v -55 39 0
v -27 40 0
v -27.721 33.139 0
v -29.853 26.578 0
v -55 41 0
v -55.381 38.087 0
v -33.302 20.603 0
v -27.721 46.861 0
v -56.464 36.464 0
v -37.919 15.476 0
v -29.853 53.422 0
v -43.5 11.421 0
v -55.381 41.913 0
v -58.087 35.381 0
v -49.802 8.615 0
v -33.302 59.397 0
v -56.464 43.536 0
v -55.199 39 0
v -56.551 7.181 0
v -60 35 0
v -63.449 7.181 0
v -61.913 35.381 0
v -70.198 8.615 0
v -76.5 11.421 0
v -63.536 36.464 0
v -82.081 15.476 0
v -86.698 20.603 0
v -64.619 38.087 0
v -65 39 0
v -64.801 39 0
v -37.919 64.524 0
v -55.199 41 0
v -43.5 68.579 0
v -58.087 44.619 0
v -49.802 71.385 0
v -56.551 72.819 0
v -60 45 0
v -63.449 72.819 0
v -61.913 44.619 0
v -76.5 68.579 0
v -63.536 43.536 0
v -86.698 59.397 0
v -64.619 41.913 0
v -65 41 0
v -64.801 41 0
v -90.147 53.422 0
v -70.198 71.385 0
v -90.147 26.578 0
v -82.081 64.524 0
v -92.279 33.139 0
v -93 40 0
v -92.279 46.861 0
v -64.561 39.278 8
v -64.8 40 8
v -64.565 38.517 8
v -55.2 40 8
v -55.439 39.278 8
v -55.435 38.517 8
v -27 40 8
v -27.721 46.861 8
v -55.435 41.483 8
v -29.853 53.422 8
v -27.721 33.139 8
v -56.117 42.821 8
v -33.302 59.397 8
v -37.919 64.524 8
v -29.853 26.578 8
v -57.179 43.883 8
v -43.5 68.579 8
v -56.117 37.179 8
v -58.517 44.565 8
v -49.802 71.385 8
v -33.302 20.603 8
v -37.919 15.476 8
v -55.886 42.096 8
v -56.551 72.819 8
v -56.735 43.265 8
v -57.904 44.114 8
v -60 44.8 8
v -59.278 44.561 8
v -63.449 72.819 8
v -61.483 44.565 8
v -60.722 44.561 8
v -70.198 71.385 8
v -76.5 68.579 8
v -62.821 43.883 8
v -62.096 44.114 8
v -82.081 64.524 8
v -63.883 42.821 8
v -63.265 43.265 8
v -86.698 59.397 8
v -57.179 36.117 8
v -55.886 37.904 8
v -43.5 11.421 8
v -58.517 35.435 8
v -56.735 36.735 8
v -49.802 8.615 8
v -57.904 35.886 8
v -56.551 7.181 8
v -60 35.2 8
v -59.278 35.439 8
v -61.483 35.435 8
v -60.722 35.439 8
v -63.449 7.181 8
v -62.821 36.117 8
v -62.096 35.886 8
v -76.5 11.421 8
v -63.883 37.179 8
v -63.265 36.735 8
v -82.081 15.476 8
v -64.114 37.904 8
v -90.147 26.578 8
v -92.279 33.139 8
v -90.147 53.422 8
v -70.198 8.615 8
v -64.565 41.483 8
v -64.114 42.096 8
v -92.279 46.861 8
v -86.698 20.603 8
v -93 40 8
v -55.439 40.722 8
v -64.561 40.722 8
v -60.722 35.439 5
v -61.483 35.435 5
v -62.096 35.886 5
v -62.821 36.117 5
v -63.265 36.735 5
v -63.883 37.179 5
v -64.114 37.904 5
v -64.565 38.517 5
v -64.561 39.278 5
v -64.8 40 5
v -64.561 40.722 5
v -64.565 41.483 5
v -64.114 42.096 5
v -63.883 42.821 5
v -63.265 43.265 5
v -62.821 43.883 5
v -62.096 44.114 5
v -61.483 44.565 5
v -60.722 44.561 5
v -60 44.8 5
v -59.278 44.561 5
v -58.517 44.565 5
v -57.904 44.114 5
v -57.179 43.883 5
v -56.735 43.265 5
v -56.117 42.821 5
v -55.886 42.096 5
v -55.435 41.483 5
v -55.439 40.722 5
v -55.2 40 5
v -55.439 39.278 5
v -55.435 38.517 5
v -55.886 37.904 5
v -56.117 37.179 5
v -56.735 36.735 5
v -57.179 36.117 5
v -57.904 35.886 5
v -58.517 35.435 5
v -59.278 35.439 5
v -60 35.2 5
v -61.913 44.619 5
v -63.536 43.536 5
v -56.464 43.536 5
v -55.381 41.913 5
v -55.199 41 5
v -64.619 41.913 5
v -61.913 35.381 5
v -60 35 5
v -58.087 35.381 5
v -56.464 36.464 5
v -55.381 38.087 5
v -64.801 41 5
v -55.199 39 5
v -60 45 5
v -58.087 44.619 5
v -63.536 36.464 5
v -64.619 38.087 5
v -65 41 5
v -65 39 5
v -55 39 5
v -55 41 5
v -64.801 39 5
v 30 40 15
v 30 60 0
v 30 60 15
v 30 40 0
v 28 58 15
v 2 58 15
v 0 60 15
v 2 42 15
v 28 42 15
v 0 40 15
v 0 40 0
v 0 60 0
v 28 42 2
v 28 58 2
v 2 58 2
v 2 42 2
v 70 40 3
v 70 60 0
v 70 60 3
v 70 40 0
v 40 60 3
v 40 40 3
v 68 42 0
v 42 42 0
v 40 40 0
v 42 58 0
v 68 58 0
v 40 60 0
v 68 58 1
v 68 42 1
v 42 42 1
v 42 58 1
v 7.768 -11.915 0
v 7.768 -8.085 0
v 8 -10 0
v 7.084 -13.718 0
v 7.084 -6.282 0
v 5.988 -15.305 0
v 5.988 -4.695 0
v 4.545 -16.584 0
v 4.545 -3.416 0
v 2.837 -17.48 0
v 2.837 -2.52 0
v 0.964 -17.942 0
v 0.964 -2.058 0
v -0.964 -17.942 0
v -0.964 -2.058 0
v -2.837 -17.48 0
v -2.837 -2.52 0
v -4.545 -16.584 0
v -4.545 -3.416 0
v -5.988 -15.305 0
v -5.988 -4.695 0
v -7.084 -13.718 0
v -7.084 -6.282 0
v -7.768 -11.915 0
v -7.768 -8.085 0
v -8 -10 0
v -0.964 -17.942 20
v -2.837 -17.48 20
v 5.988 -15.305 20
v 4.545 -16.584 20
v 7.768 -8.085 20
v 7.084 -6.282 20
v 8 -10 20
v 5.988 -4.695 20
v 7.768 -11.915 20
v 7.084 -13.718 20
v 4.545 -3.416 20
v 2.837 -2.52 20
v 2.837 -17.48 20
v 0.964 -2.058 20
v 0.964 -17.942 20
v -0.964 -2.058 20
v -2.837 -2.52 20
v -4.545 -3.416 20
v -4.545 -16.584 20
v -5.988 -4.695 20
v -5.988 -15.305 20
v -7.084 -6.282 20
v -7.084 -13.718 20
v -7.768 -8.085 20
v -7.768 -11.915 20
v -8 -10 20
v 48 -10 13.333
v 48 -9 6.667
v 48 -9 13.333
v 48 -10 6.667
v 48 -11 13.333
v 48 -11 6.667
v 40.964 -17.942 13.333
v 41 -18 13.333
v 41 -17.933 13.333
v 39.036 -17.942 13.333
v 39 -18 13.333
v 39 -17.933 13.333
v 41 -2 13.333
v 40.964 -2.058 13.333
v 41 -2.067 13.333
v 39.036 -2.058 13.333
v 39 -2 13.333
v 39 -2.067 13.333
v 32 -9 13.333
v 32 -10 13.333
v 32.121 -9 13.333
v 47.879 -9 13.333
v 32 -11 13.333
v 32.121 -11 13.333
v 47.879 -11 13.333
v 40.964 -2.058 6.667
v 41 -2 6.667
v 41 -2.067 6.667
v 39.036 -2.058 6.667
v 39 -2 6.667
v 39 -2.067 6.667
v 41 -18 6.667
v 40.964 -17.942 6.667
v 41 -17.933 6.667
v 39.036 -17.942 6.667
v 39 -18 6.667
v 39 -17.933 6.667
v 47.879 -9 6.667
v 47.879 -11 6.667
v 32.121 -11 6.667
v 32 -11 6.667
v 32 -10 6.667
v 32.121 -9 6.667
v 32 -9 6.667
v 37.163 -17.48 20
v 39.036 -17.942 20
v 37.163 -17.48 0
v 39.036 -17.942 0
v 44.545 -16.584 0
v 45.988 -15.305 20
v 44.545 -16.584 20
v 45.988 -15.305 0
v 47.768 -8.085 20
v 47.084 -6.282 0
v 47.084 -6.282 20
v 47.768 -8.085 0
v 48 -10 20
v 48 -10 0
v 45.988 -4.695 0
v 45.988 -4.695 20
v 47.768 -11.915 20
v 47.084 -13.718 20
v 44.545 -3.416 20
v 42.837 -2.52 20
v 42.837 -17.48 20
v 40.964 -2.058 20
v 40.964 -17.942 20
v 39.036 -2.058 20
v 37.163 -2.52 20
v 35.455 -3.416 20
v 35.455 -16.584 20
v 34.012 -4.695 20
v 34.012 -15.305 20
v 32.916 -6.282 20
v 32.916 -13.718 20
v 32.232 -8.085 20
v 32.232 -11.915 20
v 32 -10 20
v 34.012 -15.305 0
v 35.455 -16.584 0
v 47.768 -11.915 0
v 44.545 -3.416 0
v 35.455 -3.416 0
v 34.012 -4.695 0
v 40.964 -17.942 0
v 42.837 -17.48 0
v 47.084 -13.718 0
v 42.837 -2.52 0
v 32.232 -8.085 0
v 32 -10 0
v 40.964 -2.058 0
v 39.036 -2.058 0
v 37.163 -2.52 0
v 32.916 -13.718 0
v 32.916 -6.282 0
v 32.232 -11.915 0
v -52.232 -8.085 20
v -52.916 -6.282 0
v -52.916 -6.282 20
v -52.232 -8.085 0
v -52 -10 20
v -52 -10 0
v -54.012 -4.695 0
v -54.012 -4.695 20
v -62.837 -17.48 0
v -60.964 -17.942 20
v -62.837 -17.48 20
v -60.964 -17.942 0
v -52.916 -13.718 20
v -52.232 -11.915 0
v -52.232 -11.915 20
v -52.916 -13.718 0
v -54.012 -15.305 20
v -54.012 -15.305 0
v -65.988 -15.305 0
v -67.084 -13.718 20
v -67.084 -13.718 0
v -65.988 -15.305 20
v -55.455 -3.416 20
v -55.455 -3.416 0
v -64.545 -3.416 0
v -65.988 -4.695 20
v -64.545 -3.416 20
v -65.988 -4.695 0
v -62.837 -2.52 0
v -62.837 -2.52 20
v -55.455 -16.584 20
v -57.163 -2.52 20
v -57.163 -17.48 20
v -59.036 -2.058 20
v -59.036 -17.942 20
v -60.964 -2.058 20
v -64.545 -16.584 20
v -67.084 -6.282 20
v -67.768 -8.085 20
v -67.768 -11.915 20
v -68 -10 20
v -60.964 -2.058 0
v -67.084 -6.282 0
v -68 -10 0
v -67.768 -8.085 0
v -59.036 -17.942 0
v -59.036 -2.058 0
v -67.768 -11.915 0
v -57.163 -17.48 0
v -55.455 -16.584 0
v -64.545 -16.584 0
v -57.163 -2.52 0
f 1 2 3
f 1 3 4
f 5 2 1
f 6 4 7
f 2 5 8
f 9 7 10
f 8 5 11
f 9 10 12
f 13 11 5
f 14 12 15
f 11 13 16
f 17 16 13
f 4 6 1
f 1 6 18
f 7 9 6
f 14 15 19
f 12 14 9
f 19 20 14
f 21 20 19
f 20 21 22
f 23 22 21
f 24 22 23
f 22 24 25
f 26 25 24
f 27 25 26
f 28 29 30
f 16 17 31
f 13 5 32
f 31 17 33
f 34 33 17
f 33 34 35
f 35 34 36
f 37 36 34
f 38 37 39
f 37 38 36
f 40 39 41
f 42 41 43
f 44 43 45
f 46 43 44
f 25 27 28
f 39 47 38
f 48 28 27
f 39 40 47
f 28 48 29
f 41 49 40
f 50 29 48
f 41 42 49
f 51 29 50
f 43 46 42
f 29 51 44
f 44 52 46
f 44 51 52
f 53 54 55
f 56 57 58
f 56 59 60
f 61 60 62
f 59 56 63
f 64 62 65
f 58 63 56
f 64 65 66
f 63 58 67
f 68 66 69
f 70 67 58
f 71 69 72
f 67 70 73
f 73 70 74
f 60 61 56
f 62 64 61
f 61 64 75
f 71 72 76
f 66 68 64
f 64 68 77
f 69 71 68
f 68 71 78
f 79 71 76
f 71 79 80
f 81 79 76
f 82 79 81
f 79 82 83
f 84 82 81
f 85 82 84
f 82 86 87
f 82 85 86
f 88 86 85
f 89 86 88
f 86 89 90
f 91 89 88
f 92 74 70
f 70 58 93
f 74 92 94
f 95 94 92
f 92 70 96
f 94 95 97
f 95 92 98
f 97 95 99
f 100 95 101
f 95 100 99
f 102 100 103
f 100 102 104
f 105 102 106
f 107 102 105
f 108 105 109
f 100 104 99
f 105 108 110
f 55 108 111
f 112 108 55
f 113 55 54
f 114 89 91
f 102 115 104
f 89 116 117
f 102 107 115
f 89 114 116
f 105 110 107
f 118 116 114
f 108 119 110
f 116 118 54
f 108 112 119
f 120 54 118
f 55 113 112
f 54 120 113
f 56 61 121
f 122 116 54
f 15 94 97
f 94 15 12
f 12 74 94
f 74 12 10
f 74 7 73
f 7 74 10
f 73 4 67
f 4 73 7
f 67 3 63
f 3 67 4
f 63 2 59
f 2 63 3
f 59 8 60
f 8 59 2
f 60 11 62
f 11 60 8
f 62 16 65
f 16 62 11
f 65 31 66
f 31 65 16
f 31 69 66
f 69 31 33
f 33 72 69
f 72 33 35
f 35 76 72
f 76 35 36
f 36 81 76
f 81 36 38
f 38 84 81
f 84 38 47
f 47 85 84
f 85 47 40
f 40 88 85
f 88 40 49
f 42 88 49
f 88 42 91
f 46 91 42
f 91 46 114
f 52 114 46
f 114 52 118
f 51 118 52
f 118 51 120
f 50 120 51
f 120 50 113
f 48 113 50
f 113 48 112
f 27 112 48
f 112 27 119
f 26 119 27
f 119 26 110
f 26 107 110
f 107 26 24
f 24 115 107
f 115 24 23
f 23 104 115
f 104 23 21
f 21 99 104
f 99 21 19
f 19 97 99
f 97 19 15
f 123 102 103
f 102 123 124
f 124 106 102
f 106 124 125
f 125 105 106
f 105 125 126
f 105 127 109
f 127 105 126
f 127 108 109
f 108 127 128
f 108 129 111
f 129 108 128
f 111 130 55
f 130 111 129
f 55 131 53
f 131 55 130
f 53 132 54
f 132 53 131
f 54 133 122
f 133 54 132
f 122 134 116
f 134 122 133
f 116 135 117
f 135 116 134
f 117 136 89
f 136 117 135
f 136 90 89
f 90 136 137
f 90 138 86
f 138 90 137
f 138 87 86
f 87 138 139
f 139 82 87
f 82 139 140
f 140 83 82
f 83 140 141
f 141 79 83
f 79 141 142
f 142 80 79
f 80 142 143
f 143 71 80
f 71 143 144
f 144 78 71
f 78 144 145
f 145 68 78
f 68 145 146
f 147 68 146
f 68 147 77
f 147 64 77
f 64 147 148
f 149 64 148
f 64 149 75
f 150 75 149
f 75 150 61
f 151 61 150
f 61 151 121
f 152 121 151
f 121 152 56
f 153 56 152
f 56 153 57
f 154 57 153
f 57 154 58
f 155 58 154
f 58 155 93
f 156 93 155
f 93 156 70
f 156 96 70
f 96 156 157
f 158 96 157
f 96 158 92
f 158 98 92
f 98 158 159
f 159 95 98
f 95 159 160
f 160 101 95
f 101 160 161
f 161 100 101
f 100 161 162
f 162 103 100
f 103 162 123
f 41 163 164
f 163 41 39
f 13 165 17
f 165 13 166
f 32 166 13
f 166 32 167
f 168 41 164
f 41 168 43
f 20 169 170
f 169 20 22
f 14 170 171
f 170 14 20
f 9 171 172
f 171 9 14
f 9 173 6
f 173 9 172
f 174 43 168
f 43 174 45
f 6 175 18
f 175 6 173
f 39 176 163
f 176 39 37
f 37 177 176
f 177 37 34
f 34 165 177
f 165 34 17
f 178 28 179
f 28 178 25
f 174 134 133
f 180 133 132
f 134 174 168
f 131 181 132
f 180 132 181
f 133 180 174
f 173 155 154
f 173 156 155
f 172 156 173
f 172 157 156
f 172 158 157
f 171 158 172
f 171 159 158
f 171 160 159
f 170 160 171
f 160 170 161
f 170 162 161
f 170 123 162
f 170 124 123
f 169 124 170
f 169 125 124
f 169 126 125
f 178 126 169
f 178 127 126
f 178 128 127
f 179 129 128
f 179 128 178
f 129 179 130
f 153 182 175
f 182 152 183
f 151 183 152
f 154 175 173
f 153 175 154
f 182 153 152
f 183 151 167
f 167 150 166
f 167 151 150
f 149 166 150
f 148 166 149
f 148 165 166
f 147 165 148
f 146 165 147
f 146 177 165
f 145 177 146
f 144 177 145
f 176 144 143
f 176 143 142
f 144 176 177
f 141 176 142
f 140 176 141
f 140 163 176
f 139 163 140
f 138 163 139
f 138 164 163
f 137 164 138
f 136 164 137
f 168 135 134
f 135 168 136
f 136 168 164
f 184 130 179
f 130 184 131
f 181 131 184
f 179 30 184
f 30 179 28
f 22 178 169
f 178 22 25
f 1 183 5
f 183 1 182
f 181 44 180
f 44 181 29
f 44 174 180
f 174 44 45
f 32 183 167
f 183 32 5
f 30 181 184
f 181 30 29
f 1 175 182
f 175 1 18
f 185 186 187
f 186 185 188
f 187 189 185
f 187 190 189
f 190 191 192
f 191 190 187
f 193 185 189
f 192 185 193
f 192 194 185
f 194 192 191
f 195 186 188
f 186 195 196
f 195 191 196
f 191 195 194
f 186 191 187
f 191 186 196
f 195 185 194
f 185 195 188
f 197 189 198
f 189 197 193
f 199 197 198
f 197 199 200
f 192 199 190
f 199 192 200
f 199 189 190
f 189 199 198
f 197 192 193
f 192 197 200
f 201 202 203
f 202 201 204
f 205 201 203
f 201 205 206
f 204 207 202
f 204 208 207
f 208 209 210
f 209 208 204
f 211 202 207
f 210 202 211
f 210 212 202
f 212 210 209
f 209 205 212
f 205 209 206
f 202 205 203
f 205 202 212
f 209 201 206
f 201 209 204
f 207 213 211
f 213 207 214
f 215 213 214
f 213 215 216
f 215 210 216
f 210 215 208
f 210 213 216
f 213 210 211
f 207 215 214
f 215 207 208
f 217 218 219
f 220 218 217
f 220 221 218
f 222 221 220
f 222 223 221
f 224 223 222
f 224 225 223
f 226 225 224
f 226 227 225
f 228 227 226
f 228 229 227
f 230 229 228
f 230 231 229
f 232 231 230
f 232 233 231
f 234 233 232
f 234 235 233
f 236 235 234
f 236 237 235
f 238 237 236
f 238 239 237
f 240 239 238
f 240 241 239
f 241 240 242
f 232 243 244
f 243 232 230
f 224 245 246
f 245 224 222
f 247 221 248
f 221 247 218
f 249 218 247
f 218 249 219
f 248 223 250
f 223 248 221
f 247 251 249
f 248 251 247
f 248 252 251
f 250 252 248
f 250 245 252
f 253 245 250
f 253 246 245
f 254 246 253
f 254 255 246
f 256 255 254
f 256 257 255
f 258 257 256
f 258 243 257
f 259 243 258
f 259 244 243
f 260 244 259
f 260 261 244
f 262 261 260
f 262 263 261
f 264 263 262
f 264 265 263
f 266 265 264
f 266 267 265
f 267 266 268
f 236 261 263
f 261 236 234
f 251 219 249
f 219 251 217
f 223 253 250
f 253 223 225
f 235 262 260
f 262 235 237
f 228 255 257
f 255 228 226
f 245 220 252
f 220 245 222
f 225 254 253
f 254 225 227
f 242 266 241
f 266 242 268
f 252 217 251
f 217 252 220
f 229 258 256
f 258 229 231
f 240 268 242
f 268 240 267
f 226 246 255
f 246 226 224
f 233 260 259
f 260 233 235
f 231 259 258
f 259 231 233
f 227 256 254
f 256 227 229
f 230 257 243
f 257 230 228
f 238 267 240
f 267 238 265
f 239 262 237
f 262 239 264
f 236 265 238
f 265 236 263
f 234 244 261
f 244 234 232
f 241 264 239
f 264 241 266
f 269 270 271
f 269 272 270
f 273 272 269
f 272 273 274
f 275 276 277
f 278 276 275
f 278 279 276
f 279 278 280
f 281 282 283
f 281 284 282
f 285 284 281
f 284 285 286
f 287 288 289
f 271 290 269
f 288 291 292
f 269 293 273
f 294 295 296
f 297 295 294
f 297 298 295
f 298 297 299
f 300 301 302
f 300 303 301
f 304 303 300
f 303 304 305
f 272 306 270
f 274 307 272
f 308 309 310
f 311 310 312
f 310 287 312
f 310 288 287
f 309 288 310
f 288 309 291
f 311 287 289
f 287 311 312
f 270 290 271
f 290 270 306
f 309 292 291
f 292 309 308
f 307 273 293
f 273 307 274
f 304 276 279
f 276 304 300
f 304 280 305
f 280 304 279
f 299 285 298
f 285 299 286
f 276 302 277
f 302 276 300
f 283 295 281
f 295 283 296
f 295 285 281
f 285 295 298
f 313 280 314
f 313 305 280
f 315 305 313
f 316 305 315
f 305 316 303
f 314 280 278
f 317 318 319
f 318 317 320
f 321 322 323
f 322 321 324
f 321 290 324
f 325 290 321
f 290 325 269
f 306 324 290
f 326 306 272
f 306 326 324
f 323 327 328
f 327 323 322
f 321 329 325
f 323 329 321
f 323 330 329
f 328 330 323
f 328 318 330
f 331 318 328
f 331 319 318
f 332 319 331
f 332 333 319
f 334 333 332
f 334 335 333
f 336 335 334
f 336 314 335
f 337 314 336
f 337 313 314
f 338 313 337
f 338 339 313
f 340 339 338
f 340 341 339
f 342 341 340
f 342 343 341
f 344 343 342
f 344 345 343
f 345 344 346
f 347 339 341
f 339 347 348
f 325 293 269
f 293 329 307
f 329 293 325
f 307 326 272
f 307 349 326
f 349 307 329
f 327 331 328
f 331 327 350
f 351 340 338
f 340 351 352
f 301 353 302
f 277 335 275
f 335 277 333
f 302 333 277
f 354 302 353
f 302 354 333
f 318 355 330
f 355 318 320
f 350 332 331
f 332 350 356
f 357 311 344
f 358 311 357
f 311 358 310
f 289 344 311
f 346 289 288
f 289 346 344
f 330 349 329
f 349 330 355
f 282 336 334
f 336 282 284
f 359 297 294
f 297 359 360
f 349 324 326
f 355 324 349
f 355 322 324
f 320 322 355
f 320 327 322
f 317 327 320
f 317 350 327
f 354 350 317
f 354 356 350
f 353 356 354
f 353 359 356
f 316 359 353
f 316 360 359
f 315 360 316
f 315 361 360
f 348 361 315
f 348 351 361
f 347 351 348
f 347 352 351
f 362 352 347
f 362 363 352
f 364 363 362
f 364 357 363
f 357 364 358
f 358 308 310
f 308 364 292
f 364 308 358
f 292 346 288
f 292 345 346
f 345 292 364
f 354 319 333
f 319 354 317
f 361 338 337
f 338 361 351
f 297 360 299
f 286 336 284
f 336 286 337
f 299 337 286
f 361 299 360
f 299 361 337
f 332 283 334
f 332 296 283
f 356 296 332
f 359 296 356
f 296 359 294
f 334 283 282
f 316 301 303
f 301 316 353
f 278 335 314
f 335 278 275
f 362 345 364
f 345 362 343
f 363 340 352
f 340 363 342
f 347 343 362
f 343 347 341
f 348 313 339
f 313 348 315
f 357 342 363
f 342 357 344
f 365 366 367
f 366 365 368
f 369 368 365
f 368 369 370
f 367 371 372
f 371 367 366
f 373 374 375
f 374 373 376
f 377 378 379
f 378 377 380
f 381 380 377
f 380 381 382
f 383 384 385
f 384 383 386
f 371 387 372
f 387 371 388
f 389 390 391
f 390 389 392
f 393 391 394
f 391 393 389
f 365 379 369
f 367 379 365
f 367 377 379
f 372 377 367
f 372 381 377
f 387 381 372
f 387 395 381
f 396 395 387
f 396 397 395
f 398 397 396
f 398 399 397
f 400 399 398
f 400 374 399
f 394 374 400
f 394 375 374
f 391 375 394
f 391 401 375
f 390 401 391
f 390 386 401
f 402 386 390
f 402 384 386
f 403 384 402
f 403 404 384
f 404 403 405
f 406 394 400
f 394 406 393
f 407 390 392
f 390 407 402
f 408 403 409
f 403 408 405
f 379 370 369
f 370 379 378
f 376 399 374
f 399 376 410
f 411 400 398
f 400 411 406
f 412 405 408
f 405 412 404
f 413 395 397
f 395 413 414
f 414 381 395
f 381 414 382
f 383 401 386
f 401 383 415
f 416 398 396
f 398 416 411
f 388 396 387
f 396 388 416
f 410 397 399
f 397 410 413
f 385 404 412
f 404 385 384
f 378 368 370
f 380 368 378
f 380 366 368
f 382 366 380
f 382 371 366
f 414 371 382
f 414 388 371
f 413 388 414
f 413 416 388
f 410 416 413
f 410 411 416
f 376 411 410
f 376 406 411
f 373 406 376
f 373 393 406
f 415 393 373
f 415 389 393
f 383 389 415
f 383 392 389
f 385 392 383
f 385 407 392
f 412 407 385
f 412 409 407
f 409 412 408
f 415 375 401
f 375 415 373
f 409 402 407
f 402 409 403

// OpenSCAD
// tutorial/basic/10_parametric_design.scad
// ==============================================
// 学习目标: 掌握参数化建模技巧
// 使用全局变量、条件表达式、自定义参数实现灵活设计

// ---- 参数定义 (Customizer 友好) ----
// 齿轮参数
teeth        = 20;    // 齿数
pitch_radius = 30;    // 节圆半径
pressure_angle = 20;   // 压力角
height       = 8;     // 齿轮厚度
bore_radius  = 5;     // 轴孔半径
keyway_width = 2;     // 键槽宽

// ---- 渐开线齿轮模块 ----
module spur_gear(teeth, pr, pa, h, bore) {
    module involute_tooth() {
        // 简化渐开线齿形
        tooth_width = 2 * pr * sin(180 / teeth) / teeth * 0.8;
        intersection() {
            square([pr + 5, tooth_width * 2], center = true);
            circle(r = pr + 2);
        }
    }

    difference() {
        // 齿轮本体
        linear_extrude(height = h) {
            difference() {
                circle(r = pr + 3);

                // 切出齿槽
                for (i = [0 : teeth - 1]) {
                    rotate([0, 0, i * 360 / teeth])
                        scale([1, 0.6, 1])
                            circle(r = pr * 1.6 / teeth * 2);
                }
            }
        }

        // 轴孔
        cylinder(r = bore, h = h + 2, center = true);

        // 键槽
        translate([0, 0, 0])
            cube([bore * 2, keyway_width, h + 2], center = true);
    }
}

// ---- 参数化盒子 ----
module parametric_box(width, depth, height, wall, lid) {
    // lid = true 时输出盖子, false 时输出盒体
    if (lid) {
        // 盖子
        difference() {
            cube([width, depth, 3]);
            // 配合凸台
            translate([wall, wall, 0])
                cube([width - 2 * wall, depth - 2 * wall, 1]);
        }
    } else {
        // 盒体
        difference() {
            cube([width, depth, height]);
            translate([wall, wall, wall])
                cube([width - 2 * wall, depth - 2 * wall, height]);
        }
    }
}

// ---- 使用三元运算符的条件设计 ----
module conditional_stand(
    diameter,
    height,
    type = "simple"
// "simple", "feet", "slotted"
) {
    type_index = (type == "simple")  ? 0 :
                 (type == "feet")    ? 1 :
                 (type == "slotted") ? 2 : 0;

    // 主柱
    cylinder(r = diameter, h = height);

    if (type_index == 1) {
        // 三脚底座
        for (i = [0 : 2]) {
            rotate([0, 0, i * 120])
                translate([diameter * 0.5, 0, 0])
                    cylinder(r = diameter * 0.3, h = 2);
        }
    }

    if (type_index == 2) {
        // 开槽
        for (i = [0 : 3]) {
            rotate([0, 0, i * 90])
                translate([0, 0, height / 2])
                    cube([diameter * 2, 2, height / 3], center = true);
        }
    }
}

// ---- 阵列 ----
translate([-60, 40, 0])
    spur_gear(teeth, pitch_radius, pressure_angle, height, bore_radius);

translate([0, 40, 0])
    parametric_box(width = 30, depth = 20, height = 15, wall = 2, lid = false);

translate([40, 40, 0])
    parametric_box(width = 30, depth = 20, height = 15, wall = 2, lid = true);

translate([-60, -10, 0])
    conditional_stand(diameter = 8, height = 20, type = "simple");

translate([0, -10, 0])
    conditional_stand(diameter = 8, height = 20, type = "feet");

translate([40, -10, 0])
    conditional_stand(diameter = 8, height = 20, type = "slotted");
